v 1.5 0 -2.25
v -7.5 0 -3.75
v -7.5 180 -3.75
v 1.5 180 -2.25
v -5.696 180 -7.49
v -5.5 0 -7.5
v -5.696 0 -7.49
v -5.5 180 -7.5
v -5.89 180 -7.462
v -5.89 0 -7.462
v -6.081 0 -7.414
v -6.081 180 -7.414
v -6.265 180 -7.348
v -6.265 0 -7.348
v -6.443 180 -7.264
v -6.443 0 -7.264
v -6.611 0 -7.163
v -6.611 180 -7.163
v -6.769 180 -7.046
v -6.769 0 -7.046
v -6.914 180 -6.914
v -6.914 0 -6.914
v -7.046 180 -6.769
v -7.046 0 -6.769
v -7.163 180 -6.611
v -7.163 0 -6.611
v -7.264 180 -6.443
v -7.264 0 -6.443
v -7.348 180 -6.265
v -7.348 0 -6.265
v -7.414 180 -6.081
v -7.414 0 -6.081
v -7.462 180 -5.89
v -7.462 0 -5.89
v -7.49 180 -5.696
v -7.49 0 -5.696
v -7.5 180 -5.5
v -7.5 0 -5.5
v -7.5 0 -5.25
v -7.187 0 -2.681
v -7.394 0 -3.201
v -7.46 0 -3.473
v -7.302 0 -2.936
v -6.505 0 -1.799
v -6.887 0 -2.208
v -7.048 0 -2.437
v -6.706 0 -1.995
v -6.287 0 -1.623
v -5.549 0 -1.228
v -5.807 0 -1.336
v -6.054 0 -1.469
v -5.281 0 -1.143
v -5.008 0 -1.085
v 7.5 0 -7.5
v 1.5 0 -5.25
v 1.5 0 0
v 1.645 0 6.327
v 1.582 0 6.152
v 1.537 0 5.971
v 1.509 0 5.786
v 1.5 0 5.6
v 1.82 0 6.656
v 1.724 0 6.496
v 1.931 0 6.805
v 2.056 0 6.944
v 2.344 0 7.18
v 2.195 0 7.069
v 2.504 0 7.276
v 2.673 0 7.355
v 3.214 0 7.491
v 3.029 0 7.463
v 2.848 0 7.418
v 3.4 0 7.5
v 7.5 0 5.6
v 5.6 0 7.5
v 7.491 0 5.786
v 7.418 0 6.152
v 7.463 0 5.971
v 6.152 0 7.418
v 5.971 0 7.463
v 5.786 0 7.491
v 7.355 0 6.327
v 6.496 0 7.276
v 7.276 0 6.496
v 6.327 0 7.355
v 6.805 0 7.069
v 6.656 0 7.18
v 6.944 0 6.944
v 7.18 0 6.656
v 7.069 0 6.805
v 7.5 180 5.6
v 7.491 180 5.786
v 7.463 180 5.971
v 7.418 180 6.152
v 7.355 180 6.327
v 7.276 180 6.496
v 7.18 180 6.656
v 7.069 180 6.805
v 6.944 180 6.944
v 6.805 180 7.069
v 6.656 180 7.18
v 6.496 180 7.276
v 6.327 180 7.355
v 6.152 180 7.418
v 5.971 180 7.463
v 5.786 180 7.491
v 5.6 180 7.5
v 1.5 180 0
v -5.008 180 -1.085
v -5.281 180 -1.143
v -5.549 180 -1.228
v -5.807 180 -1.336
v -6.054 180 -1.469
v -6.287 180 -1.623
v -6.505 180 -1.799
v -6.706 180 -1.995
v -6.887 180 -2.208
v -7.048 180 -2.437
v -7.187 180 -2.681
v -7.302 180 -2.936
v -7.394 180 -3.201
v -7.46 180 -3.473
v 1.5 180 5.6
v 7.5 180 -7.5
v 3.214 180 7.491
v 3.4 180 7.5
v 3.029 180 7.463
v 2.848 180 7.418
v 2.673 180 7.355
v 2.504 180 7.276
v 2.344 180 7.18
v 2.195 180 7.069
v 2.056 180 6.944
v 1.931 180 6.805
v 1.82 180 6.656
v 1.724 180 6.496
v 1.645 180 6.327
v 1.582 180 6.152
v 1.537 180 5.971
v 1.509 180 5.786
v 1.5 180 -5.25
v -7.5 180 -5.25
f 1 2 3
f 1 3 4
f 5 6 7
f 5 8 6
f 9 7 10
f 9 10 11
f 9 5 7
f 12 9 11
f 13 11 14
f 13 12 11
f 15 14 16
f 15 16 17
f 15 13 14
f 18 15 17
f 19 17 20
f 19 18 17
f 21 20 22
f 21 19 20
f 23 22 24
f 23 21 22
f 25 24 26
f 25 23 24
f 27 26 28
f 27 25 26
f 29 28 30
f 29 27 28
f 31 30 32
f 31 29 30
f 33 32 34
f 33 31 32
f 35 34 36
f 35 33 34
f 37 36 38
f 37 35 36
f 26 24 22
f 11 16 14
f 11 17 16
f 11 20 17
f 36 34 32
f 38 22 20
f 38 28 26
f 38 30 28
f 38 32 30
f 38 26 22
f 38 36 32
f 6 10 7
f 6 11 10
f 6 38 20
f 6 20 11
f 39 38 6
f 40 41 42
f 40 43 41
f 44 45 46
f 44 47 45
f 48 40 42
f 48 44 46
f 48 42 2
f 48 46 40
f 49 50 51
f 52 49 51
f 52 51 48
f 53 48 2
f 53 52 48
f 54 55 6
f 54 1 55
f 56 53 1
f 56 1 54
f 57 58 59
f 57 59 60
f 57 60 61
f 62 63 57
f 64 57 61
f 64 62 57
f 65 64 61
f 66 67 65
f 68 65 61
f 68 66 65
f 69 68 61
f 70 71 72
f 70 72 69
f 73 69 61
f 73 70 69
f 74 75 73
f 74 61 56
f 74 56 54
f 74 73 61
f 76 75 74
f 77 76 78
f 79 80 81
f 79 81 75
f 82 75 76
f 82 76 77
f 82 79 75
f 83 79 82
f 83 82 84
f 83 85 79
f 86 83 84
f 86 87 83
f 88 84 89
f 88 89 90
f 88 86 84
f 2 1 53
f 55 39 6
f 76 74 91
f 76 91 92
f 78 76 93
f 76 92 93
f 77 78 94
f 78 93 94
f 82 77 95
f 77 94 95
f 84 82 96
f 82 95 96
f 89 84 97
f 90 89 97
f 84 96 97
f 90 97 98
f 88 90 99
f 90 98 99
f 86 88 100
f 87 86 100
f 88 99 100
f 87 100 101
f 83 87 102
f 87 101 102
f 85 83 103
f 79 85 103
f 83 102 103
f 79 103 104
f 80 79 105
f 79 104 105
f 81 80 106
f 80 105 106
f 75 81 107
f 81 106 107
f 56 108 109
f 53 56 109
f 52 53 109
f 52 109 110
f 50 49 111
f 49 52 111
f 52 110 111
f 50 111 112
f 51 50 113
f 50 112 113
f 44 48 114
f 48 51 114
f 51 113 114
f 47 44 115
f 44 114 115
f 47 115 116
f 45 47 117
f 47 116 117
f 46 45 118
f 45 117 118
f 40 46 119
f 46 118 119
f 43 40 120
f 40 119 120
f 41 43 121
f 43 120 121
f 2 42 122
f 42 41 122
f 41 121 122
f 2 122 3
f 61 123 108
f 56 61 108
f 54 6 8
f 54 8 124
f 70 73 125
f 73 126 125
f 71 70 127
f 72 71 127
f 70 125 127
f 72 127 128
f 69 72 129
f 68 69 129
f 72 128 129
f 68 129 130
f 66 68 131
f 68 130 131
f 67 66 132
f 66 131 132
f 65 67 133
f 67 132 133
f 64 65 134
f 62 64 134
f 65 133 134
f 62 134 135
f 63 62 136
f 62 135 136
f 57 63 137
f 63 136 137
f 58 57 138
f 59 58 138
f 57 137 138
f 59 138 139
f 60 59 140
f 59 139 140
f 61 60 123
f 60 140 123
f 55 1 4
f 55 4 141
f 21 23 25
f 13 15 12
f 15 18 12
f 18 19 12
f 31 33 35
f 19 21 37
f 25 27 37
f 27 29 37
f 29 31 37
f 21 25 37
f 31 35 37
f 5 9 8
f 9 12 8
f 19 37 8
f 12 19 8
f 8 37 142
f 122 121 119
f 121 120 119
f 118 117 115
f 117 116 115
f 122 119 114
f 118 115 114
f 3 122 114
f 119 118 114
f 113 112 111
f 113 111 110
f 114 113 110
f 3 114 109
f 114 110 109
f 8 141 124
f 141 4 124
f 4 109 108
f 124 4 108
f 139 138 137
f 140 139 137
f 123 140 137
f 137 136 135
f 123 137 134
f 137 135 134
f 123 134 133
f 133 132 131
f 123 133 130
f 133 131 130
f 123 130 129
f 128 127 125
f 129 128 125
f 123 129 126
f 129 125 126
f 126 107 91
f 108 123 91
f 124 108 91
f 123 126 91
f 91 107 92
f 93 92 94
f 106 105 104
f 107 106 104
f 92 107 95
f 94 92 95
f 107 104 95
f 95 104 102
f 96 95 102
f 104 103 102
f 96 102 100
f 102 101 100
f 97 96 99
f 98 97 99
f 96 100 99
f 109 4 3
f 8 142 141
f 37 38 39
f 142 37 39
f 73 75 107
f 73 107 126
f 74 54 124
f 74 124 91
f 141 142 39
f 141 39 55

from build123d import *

# Parameters (mm, degrees)
F0_W        = 9
F0_H        = 2.25
F1_DEPTH    = 180
F2_T1_DEPTH = 192.6338141032
F3_R        = 2
F4_R        = 1.9


# Not quite as in the source:
# - a fillet or chamfer that OpenCascade refuses, or shapes differently, is made with other operations: its cross-section is extruded or revolved along the edge and cut away or added


with BuildPart() as f1:
    # F0 (on Front) → F1 (new body)
    with BuildSketch(Plane.XZ):
        Polygon((1.5, -2.25), (1.5, 0), (-7.5, -1.5), (-7.5, -3.75), align=None)
        Polygon((7.5, -7.5), (7.5, 7.5), (1.5, 7.5), (1.5, 0), (1.5, -2.25), (1.5, -5.25), (1.5, -7.5), align=None)
        with Locations((-3, -6.375)):
            Rectangle(F0_W, F0_H)
    extrude(amount=-F1_DEPTH)

    # F2: fillet of radius 3 on 1 edges, made by hand

    # F2_s2 → F2_t1 (cut)
    with BuildSketch(Plane.XZ.offset(-186.3169070516)):
        with BuildLine():
            ThreePointArc((-5.0076165068, -1.0846027511), (-6.7056654696, -1.9947746893), (-7.5, -3.75))
            Line((-7.5, -3.75), (-7.5, -1.5))
            Line((-7.5, -1.5), (-5.0076165068, -1.0846027511))
        make_face()
    extrude(amount=F2_T1_DEPTH, mode=Mode.SUBTRACT)

    # F3
    f3_edges = [f1.edges().sort_by_distance(p)[0] for p in [
        (-7.5, 90, -7.5),
    ]]
    fillet(f3_edges, radius=F3_R)

    # F4
    f4_edges = [f1.edges().sort_by_distance(p)[0] for p in [
        (1.5, 90, 7.5),
        (7.5, 90, 7.5),
    ]]
    fillet(f4_edges, radius=F4_R)


solid = f1.part
